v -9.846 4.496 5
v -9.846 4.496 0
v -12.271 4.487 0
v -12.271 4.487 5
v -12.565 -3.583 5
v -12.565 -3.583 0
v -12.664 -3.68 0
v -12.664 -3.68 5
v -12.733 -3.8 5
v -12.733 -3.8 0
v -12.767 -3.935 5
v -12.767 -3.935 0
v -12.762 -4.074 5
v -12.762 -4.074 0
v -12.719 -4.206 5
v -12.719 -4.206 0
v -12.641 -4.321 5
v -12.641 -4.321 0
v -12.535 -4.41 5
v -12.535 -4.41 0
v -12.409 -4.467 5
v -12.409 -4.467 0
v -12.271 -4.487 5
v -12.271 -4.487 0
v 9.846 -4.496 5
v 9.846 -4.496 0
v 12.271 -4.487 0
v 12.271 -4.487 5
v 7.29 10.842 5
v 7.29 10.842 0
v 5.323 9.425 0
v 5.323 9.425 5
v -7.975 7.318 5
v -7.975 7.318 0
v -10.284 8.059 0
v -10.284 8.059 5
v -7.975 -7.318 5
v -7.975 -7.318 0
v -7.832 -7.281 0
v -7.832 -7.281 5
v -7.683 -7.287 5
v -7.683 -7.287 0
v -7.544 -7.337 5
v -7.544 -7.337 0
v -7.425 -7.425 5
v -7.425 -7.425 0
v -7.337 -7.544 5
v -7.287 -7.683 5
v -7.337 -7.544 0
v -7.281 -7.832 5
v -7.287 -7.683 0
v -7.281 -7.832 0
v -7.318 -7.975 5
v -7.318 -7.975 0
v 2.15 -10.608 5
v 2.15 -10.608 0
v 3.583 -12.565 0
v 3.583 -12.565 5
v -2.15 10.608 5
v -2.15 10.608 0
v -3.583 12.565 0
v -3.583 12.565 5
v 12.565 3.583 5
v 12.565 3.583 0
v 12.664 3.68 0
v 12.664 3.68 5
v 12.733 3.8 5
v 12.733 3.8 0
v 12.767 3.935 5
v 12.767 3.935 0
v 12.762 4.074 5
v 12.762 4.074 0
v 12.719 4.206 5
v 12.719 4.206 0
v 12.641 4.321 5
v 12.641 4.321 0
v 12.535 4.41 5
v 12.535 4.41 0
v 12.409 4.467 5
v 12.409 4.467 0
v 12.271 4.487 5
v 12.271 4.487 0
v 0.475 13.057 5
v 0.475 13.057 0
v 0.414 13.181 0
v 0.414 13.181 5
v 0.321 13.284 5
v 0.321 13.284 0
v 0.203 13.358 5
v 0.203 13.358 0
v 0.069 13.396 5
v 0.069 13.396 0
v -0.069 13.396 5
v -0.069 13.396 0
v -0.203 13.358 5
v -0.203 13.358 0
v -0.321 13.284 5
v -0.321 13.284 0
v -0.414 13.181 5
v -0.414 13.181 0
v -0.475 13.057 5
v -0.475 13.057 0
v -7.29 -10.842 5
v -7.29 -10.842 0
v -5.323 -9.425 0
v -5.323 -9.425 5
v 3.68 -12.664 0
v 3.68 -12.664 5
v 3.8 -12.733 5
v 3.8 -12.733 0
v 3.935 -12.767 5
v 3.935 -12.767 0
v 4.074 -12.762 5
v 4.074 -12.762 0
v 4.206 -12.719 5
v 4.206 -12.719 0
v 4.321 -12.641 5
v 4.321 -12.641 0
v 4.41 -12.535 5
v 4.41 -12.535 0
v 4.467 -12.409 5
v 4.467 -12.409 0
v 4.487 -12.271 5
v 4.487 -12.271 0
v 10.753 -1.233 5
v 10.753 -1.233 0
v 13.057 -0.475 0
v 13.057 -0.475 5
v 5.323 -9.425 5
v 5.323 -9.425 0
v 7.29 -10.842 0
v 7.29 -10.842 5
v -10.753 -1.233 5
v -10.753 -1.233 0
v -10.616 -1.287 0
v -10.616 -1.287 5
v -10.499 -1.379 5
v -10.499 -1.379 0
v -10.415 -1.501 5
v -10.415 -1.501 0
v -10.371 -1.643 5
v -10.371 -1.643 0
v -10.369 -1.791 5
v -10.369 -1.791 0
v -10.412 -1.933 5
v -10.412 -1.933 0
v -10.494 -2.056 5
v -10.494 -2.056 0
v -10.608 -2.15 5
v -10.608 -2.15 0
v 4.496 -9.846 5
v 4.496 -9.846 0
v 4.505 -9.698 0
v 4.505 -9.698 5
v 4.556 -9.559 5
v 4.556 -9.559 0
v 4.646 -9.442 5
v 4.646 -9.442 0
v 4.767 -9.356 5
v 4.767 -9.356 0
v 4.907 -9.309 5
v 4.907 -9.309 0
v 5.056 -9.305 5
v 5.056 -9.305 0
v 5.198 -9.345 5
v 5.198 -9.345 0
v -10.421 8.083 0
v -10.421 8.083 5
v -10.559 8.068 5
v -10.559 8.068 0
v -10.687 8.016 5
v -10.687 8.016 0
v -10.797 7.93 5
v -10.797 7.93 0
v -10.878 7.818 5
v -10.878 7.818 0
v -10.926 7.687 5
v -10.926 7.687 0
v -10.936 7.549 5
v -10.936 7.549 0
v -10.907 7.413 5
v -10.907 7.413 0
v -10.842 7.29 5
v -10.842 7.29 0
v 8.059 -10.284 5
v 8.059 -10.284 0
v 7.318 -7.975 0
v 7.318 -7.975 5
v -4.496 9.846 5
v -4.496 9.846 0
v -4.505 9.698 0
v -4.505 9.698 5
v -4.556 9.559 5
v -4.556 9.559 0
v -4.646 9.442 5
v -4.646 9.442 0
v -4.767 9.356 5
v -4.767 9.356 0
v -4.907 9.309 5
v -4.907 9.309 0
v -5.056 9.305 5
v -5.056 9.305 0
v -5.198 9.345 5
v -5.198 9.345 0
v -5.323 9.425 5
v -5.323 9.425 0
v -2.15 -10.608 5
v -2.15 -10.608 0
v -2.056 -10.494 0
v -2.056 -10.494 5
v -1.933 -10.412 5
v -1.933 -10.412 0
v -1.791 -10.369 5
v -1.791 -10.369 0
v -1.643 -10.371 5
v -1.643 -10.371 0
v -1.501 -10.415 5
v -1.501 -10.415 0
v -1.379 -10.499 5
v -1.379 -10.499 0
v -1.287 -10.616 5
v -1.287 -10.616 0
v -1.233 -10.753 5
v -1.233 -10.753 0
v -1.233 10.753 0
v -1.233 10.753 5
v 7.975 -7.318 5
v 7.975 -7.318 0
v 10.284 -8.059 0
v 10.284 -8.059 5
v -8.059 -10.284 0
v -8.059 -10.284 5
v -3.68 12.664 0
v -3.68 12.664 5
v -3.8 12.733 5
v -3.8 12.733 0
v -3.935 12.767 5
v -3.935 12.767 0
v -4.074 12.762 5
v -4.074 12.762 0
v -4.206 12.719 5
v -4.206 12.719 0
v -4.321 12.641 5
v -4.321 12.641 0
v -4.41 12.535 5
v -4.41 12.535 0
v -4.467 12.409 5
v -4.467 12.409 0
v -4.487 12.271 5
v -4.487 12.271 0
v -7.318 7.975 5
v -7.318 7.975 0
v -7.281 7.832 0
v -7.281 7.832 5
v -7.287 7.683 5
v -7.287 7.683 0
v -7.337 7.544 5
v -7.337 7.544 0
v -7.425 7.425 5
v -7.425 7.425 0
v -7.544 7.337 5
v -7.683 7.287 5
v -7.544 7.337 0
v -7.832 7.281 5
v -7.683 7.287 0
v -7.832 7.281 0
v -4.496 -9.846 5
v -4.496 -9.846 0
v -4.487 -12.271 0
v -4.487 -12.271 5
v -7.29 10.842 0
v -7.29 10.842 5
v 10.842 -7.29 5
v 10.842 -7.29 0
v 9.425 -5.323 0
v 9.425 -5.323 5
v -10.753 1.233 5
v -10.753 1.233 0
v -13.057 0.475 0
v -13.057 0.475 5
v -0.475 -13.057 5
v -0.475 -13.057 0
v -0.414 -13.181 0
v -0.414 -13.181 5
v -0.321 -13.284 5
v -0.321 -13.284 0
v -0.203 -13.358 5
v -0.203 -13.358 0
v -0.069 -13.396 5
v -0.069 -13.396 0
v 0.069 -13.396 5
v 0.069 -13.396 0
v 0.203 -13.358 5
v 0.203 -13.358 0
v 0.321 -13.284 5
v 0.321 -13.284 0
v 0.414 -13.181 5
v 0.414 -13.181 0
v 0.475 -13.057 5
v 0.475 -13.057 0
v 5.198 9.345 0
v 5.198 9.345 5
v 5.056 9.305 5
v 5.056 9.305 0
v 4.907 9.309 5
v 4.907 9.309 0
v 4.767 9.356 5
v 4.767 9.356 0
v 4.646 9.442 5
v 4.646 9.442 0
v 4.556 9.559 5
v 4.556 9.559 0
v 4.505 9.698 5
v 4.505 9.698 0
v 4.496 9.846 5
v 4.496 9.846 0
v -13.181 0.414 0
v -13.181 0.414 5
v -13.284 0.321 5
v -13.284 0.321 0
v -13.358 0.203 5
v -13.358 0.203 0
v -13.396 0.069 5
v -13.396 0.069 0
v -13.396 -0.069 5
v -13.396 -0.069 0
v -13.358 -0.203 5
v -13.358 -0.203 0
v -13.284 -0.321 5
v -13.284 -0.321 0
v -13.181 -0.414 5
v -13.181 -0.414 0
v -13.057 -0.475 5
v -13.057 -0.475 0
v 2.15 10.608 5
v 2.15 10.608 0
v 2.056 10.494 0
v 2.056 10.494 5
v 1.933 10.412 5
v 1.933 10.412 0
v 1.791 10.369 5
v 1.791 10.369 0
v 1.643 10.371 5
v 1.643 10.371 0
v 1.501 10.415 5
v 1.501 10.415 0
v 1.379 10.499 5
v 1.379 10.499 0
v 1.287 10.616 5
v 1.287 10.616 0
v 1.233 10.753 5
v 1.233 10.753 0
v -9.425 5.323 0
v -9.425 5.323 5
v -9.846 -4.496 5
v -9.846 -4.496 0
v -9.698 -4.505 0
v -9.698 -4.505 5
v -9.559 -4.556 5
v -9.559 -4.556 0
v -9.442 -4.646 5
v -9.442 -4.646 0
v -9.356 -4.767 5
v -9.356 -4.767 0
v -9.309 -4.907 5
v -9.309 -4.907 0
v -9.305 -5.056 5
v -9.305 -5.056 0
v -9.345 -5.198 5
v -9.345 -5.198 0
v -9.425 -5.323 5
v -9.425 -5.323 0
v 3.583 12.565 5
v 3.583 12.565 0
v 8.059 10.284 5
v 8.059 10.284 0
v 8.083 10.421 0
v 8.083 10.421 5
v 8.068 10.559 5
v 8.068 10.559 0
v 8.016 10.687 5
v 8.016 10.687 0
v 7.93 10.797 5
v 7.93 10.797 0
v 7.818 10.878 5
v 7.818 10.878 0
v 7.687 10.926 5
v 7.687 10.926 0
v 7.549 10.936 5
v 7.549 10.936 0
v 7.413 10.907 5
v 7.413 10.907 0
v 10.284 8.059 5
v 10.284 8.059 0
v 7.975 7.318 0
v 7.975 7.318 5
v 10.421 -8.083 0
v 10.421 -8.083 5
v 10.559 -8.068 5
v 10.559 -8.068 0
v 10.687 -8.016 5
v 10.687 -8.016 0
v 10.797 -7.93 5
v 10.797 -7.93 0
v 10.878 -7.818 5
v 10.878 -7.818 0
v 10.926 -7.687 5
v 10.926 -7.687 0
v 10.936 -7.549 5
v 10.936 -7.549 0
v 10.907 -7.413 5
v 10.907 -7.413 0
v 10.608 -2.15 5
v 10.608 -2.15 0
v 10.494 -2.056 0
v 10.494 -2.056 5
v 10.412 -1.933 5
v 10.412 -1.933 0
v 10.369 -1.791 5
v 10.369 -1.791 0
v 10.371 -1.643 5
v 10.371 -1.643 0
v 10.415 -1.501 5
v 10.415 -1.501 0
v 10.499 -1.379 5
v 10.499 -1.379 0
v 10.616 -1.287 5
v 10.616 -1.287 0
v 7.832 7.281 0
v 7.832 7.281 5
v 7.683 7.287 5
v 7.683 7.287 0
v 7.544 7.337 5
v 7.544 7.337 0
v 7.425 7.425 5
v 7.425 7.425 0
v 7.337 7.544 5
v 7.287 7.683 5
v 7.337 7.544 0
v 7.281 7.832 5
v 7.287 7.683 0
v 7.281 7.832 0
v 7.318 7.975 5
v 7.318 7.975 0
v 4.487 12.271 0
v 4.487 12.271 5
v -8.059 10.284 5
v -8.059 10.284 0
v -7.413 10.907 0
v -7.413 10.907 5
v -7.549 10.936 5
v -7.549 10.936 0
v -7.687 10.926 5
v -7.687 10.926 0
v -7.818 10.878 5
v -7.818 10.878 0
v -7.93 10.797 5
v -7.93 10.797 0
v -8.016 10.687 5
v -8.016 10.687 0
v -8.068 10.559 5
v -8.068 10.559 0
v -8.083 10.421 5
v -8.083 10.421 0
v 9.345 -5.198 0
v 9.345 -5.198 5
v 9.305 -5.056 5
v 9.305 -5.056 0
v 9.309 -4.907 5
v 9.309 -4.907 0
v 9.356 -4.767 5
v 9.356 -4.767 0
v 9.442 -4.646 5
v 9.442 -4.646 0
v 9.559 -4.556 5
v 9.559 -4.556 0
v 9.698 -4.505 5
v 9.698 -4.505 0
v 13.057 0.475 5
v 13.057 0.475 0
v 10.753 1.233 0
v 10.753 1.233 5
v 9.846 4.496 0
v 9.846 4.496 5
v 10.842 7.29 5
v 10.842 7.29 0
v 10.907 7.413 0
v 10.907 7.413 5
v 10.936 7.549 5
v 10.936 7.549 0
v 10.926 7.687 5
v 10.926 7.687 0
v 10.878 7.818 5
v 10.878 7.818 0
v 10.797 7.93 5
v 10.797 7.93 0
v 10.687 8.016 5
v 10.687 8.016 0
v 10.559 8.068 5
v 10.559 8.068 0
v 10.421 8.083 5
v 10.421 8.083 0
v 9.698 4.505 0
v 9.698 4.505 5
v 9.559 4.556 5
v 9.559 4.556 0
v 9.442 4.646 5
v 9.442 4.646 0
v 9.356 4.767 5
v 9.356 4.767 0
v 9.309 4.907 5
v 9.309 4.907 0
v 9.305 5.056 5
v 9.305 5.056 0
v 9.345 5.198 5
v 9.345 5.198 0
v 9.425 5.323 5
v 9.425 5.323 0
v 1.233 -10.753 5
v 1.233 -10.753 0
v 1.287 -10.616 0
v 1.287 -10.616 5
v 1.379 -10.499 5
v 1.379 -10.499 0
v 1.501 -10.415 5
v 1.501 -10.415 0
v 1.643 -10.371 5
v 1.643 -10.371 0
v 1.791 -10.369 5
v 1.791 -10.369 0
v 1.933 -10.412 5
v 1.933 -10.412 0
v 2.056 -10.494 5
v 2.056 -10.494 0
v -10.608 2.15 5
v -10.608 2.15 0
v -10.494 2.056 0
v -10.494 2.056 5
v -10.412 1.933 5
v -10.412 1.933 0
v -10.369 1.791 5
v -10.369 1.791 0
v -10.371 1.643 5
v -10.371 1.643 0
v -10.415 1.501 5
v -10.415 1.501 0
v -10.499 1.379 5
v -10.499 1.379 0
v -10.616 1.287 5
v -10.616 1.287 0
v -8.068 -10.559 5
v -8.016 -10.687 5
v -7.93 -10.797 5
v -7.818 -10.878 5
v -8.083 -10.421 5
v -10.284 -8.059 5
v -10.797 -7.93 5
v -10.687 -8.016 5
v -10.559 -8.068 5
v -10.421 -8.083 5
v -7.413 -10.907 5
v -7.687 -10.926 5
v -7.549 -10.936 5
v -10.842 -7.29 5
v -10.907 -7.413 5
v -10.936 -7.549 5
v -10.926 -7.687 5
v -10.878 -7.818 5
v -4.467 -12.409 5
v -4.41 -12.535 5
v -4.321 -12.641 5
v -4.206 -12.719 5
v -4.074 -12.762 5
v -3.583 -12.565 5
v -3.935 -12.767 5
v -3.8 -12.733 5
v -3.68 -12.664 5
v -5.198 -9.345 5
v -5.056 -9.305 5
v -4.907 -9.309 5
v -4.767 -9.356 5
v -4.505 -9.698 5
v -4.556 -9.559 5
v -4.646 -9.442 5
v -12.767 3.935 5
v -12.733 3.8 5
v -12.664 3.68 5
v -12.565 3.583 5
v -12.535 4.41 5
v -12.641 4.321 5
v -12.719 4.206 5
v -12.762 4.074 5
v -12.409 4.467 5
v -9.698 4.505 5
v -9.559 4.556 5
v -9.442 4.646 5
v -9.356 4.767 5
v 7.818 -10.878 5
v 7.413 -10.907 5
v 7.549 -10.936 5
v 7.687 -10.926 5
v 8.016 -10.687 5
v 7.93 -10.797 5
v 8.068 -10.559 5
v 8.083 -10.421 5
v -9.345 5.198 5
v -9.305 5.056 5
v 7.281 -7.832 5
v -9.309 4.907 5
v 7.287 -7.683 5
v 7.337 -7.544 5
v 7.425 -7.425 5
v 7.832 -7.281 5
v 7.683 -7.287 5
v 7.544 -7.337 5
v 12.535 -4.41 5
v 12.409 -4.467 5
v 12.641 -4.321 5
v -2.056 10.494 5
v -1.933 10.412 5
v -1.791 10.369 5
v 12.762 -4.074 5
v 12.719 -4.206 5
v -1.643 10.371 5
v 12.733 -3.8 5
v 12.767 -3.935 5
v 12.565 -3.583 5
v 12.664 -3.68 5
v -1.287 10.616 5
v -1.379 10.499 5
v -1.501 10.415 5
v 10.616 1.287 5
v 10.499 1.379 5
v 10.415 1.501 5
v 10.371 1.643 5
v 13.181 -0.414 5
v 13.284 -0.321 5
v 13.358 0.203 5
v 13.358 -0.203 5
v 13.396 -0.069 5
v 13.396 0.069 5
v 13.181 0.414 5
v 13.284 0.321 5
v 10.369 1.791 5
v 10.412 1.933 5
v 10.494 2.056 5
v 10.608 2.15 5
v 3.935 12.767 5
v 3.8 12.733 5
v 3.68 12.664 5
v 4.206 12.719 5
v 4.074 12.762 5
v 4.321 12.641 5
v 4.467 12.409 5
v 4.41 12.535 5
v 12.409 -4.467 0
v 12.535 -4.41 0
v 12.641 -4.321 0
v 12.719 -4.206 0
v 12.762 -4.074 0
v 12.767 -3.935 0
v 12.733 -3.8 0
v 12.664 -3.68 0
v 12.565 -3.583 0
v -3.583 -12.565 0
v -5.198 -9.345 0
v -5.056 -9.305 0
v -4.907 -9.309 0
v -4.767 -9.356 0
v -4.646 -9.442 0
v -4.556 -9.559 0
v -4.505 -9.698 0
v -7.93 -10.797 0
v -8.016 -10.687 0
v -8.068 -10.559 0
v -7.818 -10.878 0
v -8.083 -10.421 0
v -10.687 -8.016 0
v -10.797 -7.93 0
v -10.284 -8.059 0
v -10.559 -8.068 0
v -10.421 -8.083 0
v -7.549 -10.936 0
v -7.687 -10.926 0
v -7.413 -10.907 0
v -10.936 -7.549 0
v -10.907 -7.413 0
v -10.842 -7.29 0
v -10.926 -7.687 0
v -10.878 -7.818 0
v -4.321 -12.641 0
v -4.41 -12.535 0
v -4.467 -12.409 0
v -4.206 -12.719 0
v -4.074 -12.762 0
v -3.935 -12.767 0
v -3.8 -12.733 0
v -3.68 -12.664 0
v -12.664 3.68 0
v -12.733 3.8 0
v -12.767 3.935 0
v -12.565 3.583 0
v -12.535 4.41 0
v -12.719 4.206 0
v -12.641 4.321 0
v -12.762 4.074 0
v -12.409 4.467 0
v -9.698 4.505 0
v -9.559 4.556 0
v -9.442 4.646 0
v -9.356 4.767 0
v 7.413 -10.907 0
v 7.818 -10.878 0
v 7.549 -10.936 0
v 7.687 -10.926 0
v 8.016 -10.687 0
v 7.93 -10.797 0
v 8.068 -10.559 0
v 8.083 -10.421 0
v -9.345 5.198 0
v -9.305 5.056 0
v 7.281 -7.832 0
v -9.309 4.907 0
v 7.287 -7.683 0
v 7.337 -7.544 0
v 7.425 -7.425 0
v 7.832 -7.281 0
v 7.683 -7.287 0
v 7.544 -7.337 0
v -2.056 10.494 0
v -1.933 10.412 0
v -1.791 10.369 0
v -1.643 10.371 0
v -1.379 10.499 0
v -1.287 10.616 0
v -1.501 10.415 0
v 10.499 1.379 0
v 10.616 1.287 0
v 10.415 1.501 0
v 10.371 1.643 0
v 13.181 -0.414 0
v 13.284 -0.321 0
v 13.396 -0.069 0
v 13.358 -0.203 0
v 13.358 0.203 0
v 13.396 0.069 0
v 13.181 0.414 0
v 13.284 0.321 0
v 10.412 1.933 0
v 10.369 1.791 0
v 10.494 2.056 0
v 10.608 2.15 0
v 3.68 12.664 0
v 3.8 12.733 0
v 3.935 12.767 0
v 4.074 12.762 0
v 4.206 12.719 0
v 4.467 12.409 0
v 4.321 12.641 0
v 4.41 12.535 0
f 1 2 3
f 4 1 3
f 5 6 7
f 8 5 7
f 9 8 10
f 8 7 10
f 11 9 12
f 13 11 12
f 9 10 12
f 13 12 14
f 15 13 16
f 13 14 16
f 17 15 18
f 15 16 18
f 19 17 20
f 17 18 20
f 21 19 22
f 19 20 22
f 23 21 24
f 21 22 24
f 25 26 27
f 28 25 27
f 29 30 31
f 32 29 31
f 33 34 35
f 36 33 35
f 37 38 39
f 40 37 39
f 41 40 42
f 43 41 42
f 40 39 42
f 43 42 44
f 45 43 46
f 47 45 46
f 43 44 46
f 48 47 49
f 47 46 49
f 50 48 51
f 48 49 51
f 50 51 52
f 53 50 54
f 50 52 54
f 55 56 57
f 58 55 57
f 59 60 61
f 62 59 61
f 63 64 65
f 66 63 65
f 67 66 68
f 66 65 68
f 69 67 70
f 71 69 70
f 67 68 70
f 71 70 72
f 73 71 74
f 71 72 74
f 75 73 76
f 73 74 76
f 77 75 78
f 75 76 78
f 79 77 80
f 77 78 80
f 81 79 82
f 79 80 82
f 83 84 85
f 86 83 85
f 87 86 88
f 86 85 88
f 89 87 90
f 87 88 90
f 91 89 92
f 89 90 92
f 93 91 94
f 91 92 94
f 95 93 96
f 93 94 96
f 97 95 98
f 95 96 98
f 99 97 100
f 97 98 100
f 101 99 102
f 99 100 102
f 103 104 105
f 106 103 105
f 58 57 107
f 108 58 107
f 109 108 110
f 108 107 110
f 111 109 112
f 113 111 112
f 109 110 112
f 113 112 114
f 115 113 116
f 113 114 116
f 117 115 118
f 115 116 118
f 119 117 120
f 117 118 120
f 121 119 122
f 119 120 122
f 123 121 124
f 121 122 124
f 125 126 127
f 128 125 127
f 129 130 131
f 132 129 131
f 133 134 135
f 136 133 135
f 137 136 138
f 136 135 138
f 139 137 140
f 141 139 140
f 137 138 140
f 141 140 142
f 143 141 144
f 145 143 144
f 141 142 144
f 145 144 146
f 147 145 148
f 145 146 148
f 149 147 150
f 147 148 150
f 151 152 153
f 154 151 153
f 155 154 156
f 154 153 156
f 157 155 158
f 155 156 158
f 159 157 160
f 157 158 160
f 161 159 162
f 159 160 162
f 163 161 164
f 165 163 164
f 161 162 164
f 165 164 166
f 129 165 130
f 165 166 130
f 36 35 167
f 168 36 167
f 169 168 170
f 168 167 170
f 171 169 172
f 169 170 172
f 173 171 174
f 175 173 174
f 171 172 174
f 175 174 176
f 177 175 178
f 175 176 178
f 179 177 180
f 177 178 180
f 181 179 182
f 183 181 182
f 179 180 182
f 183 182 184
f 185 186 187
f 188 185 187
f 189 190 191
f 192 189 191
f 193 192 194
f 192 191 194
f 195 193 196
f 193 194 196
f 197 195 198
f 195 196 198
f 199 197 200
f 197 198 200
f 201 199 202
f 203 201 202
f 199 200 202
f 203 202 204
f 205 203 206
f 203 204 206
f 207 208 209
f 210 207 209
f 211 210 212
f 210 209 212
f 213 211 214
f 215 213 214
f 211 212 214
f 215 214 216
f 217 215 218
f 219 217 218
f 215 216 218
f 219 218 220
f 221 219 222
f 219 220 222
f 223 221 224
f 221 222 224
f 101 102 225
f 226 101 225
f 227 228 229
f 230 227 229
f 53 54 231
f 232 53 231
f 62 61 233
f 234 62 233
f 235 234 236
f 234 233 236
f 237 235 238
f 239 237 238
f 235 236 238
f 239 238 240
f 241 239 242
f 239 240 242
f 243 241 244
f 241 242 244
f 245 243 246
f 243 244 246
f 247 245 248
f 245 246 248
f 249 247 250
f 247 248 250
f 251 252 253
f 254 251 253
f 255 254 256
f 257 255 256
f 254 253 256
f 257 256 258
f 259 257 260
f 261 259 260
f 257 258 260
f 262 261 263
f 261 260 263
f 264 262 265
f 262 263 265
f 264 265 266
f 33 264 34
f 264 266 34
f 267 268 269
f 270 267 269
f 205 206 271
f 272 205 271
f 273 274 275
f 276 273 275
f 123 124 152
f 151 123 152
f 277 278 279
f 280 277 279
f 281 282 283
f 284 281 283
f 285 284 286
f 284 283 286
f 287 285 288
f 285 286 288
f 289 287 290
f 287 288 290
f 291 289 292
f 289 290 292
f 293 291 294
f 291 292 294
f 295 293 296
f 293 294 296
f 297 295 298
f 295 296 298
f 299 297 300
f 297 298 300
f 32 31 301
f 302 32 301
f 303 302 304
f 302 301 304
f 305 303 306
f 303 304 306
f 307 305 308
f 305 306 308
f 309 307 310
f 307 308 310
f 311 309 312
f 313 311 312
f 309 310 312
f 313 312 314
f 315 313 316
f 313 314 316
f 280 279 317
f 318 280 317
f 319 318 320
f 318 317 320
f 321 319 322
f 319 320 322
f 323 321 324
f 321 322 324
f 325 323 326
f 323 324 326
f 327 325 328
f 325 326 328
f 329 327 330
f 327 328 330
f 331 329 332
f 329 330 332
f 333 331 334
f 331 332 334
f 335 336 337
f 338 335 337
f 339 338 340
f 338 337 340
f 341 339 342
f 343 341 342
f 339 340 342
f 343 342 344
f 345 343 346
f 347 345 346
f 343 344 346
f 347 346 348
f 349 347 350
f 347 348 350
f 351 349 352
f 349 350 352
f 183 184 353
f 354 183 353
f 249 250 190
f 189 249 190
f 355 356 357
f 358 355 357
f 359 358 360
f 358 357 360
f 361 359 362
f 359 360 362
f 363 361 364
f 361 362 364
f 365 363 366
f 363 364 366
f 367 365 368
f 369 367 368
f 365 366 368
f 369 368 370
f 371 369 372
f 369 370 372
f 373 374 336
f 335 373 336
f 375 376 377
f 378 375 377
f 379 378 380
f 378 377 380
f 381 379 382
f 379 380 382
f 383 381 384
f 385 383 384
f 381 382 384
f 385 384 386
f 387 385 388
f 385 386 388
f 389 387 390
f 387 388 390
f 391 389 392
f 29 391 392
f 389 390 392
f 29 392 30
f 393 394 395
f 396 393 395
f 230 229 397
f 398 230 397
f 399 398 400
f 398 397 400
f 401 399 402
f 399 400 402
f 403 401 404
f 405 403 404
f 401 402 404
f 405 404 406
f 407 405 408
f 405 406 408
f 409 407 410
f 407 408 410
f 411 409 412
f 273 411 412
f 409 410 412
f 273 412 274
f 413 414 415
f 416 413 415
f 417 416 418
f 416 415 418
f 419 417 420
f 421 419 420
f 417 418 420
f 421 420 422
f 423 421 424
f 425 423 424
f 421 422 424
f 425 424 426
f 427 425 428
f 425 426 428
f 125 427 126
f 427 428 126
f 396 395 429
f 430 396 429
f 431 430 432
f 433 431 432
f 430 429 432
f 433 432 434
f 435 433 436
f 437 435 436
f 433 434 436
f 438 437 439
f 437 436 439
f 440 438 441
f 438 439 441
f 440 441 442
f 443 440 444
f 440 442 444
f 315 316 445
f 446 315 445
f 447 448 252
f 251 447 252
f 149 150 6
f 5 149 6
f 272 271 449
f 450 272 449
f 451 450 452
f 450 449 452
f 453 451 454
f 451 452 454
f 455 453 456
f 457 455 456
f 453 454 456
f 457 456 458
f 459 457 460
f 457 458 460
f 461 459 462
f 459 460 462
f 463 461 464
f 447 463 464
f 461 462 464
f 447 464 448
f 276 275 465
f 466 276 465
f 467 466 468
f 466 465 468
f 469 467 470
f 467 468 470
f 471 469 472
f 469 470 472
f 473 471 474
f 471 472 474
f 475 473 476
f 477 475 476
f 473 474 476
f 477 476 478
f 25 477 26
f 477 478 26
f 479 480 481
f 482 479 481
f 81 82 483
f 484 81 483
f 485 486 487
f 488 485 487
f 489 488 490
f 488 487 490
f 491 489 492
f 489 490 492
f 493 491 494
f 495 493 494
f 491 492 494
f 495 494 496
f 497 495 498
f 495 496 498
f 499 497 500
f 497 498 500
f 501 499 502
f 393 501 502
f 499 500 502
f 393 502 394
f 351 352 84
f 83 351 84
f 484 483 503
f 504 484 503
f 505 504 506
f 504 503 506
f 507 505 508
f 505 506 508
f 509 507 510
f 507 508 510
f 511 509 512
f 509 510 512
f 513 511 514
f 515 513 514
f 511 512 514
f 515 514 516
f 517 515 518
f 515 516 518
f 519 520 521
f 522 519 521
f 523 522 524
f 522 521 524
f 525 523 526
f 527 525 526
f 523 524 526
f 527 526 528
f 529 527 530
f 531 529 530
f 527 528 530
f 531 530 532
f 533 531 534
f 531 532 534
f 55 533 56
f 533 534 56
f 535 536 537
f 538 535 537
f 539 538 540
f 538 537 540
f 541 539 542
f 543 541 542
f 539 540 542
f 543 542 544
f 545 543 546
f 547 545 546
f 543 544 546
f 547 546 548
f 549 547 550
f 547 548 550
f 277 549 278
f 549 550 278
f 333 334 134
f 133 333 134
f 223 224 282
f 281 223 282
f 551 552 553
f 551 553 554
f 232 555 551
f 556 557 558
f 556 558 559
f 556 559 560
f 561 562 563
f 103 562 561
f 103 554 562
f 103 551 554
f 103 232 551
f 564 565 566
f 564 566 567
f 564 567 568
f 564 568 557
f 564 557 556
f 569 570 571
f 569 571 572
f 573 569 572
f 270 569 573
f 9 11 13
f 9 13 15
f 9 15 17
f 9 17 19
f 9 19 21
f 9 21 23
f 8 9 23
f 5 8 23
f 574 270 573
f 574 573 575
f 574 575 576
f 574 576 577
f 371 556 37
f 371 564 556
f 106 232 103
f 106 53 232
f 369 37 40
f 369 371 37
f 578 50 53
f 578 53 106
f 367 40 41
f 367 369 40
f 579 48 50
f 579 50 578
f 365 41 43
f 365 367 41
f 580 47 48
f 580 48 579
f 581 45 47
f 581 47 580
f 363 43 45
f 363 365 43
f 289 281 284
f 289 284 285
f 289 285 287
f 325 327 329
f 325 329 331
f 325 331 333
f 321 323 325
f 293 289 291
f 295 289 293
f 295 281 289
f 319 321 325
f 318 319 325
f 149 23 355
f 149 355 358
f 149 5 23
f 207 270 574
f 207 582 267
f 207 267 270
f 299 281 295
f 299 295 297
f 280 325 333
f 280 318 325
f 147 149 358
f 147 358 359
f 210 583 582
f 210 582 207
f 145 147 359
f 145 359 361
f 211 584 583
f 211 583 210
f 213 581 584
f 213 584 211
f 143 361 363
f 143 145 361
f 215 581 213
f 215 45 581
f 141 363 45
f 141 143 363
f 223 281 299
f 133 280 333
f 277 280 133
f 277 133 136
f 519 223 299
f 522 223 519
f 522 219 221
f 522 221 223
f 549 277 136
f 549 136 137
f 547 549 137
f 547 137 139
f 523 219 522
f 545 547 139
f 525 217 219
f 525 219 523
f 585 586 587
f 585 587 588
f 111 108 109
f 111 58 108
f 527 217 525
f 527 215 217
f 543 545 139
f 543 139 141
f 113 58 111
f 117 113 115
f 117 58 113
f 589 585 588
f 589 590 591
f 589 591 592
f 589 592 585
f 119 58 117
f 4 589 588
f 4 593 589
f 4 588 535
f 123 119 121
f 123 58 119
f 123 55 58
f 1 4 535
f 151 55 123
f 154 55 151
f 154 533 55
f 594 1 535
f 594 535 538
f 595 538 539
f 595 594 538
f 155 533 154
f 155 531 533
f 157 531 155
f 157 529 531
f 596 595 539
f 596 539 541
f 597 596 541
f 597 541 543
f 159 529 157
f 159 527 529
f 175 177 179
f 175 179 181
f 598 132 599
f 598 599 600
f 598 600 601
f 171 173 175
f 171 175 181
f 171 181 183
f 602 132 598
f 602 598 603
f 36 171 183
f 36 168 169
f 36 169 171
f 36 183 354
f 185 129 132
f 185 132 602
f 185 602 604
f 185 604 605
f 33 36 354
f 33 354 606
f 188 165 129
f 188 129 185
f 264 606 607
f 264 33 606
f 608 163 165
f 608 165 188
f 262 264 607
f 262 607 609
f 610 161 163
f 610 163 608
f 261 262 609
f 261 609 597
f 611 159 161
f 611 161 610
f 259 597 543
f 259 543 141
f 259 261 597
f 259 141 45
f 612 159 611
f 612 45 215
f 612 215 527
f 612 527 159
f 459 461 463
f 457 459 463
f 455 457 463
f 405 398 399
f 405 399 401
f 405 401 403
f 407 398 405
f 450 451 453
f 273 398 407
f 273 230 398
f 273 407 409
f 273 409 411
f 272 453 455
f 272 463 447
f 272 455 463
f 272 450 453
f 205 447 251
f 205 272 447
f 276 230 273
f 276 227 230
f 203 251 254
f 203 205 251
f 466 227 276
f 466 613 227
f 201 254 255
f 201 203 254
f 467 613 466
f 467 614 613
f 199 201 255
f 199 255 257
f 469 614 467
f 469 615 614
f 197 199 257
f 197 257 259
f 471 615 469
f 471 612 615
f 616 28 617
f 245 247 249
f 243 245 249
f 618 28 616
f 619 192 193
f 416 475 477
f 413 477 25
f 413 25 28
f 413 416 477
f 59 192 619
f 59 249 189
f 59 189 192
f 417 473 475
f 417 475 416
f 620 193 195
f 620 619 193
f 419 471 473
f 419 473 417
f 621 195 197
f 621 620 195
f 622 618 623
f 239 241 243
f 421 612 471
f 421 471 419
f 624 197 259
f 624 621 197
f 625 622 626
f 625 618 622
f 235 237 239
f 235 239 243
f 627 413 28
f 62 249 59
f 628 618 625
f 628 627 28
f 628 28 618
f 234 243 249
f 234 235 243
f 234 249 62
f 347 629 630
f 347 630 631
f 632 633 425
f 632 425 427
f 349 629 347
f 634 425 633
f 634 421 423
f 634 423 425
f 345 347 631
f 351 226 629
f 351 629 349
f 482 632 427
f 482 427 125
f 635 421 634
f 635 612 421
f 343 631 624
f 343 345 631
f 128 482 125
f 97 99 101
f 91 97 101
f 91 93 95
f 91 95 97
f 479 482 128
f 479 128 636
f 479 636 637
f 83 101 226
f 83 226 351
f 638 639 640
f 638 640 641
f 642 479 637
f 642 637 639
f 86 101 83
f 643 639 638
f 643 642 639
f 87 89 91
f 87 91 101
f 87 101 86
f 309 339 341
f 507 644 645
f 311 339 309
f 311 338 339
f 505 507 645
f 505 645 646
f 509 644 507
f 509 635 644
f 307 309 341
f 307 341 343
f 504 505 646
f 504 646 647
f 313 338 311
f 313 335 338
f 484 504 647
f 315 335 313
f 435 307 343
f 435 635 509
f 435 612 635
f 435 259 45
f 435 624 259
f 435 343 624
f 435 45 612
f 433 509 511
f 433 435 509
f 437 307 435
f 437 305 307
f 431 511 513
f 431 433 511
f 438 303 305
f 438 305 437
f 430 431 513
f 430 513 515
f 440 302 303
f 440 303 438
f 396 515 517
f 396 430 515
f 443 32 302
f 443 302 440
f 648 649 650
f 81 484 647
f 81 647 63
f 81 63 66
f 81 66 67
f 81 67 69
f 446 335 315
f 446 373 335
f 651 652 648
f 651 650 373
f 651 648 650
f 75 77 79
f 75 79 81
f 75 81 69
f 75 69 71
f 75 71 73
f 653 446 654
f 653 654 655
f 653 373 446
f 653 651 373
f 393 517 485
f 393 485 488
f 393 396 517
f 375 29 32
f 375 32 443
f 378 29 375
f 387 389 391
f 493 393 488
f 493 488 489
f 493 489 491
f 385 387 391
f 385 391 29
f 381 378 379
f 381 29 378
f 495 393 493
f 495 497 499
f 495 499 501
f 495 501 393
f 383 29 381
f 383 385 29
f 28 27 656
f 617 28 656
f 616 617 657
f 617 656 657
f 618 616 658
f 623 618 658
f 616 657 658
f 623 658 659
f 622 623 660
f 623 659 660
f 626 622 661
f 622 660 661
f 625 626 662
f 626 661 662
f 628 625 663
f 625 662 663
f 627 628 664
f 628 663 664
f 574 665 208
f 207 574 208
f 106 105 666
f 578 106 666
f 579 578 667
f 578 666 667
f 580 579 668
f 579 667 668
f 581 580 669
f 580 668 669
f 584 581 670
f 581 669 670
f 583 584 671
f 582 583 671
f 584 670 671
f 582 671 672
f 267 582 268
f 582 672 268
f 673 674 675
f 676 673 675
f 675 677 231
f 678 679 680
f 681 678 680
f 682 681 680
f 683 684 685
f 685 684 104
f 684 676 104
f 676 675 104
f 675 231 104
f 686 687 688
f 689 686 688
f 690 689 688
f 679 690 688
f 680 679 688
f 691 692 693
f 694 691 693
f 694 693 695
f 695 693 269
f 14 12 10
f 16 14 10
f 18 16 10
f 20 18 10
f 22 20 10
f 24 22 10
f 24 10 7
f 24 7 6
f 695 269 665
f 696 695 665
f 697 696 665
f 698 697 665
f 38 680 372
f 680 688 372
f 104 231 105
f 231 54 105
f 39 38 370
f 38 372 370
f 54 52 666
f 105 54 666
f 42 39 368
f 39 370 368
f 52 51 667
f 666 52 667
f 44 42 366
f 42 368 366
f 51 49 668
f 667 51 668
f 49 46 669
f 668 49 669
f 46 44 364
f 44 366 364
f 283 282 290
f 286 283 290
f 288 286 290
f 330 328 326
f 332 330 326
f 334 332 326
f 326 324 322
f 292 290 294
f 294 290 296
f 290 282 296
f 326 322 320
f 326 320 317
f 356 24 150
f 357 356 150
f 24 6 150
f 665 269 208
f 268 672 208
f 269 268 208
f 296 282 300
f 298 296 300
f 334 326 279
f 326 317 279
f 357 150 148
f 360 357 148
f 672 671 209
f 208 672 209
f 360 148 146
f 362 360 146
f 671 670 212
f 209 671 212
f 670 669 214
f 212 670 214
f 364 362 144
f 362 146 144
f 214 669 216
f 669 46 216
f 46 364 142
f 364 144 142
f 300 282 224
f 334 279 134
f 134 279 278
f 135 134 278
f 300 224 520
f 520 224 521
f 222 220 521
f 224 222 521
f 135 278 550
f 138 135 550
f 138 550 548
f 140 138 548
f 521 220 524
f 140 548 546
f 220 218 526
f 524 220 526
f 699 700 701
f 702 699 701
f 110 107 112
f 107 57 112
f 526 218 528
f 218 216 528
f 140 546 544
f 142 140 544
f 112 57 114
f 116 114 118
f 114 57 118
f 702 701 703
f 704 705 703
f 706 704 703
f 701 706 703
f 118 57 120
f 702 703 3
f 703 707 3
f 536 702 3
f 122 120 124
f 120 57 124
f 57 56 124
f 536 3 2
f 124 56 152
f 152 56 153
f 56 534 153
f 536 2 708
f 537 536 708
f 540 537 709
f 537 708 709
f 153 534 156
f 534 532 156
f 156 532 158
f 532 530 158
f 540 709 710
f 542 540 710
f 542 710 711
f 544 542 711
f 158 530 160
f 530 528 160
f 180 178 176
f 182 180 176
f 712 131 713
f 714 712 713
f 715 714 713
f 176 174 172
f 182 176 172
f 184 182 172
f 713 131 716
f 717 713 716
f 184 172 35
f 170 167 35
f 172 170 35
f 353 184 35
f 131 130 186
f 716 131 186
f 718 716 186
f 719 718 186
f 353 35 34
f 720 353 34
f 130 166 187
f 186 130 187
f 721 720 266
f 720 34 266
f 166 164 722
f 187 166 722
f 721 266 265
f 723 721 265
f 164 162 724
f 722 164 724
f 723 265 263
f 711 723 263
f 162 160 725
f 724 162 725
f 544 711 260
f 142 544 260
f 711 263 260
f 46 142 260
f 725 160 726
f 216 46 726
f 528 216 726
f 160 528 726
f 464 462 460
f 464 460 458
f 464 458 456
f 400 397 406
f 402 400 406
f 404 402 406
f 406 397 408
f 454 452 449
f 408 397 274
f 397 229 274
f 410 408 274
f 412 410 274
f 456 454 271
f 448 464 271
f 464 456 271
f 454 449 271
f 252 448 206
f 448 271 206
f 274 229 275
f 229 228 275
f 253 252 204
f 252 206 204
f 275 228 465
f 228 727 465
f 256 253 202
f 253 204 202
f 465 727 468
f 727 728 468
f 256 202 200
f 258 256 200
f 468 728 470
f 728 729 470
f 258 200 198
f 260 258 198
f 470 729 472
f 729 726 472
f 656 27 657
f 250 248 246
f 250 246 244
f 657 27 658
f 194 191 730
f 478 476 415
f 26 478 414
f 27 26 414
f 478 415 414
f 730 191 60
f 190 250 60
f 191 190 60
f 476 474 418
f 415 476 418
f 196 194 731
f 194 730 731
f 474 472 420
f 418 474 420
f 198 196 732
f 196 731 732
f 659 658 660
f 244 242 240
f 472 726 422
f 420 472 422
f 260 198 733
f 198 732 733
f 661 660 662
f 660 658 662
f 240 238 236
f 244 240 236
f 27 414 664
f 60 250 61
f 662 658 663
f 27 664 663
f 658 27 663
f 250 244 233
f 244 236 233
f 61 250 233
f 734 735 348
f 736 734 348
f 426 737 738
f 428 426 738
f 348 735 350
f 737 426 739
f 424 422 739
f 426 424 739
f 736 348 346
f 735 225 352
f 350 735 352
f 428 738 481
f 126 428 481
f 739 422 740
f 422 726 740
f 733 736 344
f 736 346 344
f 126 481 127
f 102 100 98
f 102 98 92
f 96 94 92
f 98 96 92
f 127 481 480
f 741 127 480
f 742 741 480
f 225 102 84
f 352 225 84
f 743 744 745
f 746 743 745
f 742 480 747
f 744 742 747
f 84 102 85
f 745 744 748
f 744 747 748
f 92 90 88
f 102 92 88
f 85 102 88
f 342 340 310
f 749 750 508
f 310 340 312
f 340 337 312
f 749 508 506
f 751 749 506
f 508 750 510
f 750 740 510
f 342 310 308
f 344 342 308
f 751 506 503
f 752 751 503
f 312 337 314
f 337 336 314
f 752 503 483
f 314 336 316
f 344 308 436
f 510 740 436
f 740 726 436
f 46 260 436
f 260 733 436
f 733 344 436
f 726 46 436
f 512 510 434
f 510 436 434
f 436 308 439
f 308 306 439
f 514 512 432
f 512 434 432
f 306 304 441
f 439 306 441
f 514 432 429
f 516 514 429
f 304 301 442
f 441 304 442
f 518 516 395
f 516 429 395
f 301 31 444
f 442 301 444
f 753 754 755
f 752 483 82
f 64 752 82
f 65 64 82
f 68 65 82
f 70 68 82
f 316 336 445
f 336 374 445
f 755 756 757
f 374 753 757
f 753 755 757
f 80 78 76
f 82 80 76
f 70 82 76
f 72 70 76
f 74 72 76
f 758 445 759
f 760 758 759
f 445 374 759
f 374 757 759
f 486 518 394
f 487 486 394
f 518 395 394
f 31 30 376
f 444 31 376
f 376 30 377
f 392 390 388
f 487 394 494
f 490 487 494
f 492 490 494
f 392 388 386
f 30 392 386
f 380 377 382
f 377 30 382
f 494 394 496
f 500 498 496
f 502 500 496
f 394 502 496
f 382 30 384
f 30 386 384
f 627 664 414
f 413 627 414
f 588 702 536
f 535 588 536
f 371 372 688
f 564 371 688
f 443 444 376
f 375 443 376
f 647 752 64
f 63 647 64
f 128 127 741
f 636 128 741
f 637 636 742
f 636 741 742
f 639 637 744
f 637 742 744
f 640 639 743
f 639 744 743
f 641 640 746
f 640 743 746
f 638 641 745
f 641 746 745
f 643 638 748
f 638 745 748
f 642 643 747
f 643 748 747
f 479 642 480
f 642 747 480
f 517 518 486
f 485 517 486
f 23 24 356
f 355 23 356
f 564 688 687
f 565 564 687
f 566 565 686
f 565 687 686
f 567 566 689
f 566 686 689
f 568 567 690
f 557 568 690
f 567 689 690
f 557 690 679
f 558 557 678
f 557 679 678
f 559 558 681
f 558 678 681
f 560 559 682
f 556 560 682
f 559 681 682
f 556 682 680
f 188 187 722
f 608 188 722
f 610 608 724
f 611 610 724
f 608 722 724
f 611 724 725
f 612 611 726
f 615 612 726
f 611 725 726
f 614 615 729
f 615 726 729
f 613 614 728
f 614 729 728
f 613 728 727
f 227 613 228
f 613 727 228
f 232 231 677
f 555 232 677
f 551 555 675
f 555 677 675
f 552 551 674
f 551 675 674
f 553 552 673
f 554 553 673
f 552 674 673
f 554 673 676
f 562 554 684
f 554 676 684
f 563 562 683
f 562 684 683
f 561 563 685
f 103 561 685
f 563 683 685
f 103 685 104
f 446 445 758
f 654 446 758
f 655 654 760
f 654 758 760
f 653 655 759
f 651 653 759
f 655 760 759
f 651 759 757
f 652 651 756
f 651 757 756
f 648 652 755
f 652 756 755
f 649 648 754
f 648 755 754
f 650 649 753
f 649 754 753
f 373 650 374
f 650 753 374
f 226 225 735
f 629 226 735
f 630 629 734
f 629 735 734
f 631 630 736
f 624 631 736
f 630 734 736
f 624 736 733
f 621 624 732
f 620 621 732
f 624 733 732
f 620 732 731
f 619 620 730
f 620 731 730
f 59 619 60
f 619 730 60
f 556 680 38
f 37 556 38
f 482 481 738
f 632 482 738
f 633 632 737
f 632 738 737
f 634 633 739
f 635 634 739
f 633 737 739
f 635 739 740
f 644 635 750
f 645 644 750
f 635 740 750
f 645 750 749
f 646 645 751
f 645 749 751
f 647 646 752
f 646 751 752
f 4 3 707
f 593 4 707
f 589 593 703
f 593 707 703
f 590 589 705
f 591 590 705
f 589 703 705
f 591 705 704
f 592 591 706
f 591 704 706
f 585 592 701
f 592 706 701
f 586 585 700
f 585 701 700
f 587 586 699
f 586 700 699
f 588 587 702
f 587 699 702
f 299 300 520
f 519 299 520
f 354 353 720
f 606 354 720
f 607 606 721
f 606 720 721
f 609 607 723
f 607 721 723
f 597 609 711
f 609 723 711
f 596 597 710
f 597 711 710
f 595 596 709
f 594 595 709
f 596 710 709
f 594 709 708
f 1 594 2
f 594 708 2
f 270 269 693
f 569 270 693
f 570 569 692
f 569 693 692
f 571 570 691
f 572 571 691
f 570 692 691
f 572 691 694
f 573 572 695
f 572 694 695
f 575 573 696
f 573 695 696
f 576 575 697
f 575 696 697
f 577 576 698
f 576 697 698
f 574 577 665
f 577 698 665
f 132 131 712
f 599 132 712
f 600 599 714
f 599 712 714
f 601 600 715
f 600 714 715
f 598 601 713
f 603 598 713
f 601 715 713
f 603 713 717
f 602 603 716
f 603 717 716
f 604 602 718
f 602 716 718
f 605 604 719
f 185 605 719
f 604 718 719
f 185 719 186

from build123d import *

# Parameters (mm, degrees)
F1_DEPTH = 5


with BuildPart() as f1:
    # F0 (on Top) → F1 (new body)
    with BuildSketch(Plane.XY):
        with BuildLine():
            Line((-0.474925, 13.057005), (-1.233272, 10.753499))
            ThreePointArc((-1.233272, 10.753499), (-1.642562, 10.370728), (-2.150102, 10.608287))
            Line((-2.150102, 10.608287), (-3.583156, 12.564709))
            ThreePointArc((-3.583156, 12.564709), (-4.141029, 12.744778), (-4.486517, 12.271189))
            Line((-4.486517, 12.271189), (-4.495926, 9.846083))
            ThreePointArc((-4.495926, 9.846083), (-4.7669, 9.355569), (-5.32301, 9.424663))
            Line((-5.32301, 9.424663), (-7.290492, 10.842493))
            ThreePointArc((-7.290492, 10.842493), (-7.876706, 10.841355), (-8.058937, 10.284185))
            Line((-8.058937, 10.284185), (-7.318486, 7.974864))
            ThreePointArc((-7.318486, 7.974864), (-7.424621, 7.424621), (-7.974864, 7.318486))
            Line((-7.974864, 7.318486), (-10.284185, 8.058937))
            ThreePointArc((-10.284185, 8.058937), (-10.841355, 7.876706), (-10.842493, 7.290492))
            Line((-10.842493, 7.290492), (-9.424663, 5.32301))
            ThreePointArc((-9.424663, 5.32301), (-9.355569, 4.7669), (-9.846083, 4.495926))
            Line((-9.846083, 4.495926), (-12.271189, 4.486517))
            ThreePointArc((-12.271189, 4.486517), (-12.744778, 4.141029), (-12.564709, 3.583156))
            Line((-12.564709, 3.583156), (-10.608287, 2.150102))
            ThreePointArc((-10.608287, 2.150102), (-10.370728, 1.642562), (-10.753499, 1.233272))
            Line((-10.753499, 1.233272), (-13.057005, 0.474925))
            ThreePointArc((-13.057005, 0.474925), (-13.400652, 0), (-13.057005, -0.474925))
            Line((-13.057005, -0.474925), (-10.753499, -1.233272))
            ThreePointArc((-10.753499, -1.233272), (-10.370728, -1.642562), (-10.608287, -2.150102))
            Line((-10.608287, -2.150102), (-12.564709, -3.583156))
            ThreePointArc((-12.564709, -3.583156), (-12.744778, -4.141029), (-12.271189, -4.486517))
            Line((-12.271189, -4.486517), (-9.846083, -4.495926))
            ThreePointArc((-9.846083, -4.495926), (-9.355569, -4.7669), (-9.424663, -5.32301))
            Line((-9.424663, -5.32301), (-10.842493, -7.290492))
            ThreePointArc((-10.842493, -7.290492), (-10.841355, -7.876706), (-10.284185, -8.058937))
            Line((-10.284185, -8.058937), (-7.974864, -7.318486))
            ThreePointArc((-7.974864, -7.318486), (-7.424621, -7.424621), (-7.318486, -7.974864))
            Line((-7.318486, -7.974864), (-8.058937, -10.284185))
            ThreePointArc((-8.058937, -10.284185), (-7.876706, -10.841355), (-7.290492, -10.842493))
            Line((-7.290492, -10.842493), (-5.32301, -9.424663))
            ThreePointArc((-5.32301, -9.424663), (-4.7669, -9.355569), (-4.495926, -9.846083))
            Line((-4.495926, -9.846083), (-4.486517, -12.271189))
            ThreePointArc((-4.486517, -12.271189), (-4.141029, -12.744778), (-3.583156, -12.564709))
            Line((-3.583156, -12.564709), (-2.150102, -10.608287))
            ThreePointArc((-2.150102, -10.608287), (-1.642562, -10.370728), (-1.233272, -10.753499))
            Line((-1.233272, -10.753499), (-0.474925, -13.057005))
            ThreePointArc((-0.474925, -13.057005), (0, -13.400652), (0.474925, -13.057005))
            Line((0.474925, -13.057005), (1.233272, -10.753499))
            ThreePointArc((1.233272, -10.753499), (1.642562, -10.370728), (2.150102, -10.608287))
            Line((2.150102, -10.608287), (3.583156, -12.564709))
            ThreePointArc((3.583156, -12.564709), (4.141029, -12.744778), (4.486517, -12.271189))
            Line((4.486517, -12.271189), (4.495926, -9.846083))
            ThreePointArc((4.495926, -9.846083), (4.7669, -9.355569), (5.32301, -9.424663))
            Line((5.32301, -9.424663), (7.290492, -10.842493))
            ThreePointArc((7.290492, -10.842493), (7.876706, -10.841355), (8.058937, -10.284185))
            Line((8.058937, -10.284185), (7.318486, -7.974864))
            ThreePointArc((7.318486, -7.974864), (7.424621, -7.424621), (7.974864, -7.318486))
            Line((7.974864, -7.318486), (10.284185, -8.058937))
            ThreePointArc((10.284185, -8.058937), (10.841355, -7.876706), (10.842493, -7.290492))
            Line((10.842493, -7.290492), (9.424663, -5.32301))
            ThreePointArc((9.424663, -5.32301), (9.355569, -4.7669), (9.846083, -4.495926))
            Line((9.846083, -4.495926), (12.271189, -4.486517))
            ThreePointArc((12.271189, -4.486517), (12.744778, -4.141029), (12.564709, -3.583156))
            Line((12.564709, -3.583156), (10.608287, -2.150102))
            ThreePointArc((10.608287, -2.150102), (10.370728, -1.642562), (10.753499, -1.233272))
            Line((10.753499, -1.233272), (13.057005, -0.474925))
            ThreePointArc((13.057005, -0.474925), (13.400652, 0), (13.057005, 0.474925))
            Line((13.057005, 0.474925), (10.753499, 1.233272))
            ThreePointArc((10.753499, 1.233272), (10.370728, 1.642562), (10.608287, 2.150102))
            Line((10.608287, 2.150102), (12.564709, 3.583156))
            ThreePointArc((12.564709, 3.583156), (12.744778, 4.141029), (12.271189, 4.486517))
            Line((12.271189, 4.486517), (9.846083, 4.495926))
            ThreePointArc((9.846083, 4.495926), (9.355569, 4.7669), (9.424663, 5.32301))
            Line((9.424663, 5.32301), (10.842493, 7.290492))
            ThreePointArc((10.842493, 7.290492), (10.841355, 7.876706), (10.284185, 8.058937))
            Line((10.284185, 8.058937), (7.974864, 7.318486))
            ThreePointArc((7.974864, 7.318486), (7.424621, 7.424621), (7.318486, 7.974864))
            Line((7.318486, 7.974864), (8.058937, 10.284185))
            ThreePointArc((8.058937, 10.284185), (7.876706, 10.841355), (7.290492, 10.842493))
            Line((7.290492, 10.842493), (5.32301, 9.424663))
            ThreePointArc((5.32301, 9.424663), (4.7669, 9.355569), (4.495926, 9.846083))
            Line((4.495926, 9.846083), (4.486517, 12.271189))
            ThreePointArc((4.486517, 12.271189), (4.141029, 12.744778), (3.583156, 12.564709))
            Line((3.583156, 12.564709), (2.150102, 10.608287))
            ThreePointArc((2.150102, 10.608287), (1.642562, 10.370728), (1.233272, 10.753499))
            Line((1.233272, 10.753499), (0.474925, 13.057005))
            ThreePointArc((0.474925, 13.057005), (0, 13.400652), (-0.474925, 13.057005))
        make_face()
    extrude(amount=F1_DEPTH)


solid = f1.part
